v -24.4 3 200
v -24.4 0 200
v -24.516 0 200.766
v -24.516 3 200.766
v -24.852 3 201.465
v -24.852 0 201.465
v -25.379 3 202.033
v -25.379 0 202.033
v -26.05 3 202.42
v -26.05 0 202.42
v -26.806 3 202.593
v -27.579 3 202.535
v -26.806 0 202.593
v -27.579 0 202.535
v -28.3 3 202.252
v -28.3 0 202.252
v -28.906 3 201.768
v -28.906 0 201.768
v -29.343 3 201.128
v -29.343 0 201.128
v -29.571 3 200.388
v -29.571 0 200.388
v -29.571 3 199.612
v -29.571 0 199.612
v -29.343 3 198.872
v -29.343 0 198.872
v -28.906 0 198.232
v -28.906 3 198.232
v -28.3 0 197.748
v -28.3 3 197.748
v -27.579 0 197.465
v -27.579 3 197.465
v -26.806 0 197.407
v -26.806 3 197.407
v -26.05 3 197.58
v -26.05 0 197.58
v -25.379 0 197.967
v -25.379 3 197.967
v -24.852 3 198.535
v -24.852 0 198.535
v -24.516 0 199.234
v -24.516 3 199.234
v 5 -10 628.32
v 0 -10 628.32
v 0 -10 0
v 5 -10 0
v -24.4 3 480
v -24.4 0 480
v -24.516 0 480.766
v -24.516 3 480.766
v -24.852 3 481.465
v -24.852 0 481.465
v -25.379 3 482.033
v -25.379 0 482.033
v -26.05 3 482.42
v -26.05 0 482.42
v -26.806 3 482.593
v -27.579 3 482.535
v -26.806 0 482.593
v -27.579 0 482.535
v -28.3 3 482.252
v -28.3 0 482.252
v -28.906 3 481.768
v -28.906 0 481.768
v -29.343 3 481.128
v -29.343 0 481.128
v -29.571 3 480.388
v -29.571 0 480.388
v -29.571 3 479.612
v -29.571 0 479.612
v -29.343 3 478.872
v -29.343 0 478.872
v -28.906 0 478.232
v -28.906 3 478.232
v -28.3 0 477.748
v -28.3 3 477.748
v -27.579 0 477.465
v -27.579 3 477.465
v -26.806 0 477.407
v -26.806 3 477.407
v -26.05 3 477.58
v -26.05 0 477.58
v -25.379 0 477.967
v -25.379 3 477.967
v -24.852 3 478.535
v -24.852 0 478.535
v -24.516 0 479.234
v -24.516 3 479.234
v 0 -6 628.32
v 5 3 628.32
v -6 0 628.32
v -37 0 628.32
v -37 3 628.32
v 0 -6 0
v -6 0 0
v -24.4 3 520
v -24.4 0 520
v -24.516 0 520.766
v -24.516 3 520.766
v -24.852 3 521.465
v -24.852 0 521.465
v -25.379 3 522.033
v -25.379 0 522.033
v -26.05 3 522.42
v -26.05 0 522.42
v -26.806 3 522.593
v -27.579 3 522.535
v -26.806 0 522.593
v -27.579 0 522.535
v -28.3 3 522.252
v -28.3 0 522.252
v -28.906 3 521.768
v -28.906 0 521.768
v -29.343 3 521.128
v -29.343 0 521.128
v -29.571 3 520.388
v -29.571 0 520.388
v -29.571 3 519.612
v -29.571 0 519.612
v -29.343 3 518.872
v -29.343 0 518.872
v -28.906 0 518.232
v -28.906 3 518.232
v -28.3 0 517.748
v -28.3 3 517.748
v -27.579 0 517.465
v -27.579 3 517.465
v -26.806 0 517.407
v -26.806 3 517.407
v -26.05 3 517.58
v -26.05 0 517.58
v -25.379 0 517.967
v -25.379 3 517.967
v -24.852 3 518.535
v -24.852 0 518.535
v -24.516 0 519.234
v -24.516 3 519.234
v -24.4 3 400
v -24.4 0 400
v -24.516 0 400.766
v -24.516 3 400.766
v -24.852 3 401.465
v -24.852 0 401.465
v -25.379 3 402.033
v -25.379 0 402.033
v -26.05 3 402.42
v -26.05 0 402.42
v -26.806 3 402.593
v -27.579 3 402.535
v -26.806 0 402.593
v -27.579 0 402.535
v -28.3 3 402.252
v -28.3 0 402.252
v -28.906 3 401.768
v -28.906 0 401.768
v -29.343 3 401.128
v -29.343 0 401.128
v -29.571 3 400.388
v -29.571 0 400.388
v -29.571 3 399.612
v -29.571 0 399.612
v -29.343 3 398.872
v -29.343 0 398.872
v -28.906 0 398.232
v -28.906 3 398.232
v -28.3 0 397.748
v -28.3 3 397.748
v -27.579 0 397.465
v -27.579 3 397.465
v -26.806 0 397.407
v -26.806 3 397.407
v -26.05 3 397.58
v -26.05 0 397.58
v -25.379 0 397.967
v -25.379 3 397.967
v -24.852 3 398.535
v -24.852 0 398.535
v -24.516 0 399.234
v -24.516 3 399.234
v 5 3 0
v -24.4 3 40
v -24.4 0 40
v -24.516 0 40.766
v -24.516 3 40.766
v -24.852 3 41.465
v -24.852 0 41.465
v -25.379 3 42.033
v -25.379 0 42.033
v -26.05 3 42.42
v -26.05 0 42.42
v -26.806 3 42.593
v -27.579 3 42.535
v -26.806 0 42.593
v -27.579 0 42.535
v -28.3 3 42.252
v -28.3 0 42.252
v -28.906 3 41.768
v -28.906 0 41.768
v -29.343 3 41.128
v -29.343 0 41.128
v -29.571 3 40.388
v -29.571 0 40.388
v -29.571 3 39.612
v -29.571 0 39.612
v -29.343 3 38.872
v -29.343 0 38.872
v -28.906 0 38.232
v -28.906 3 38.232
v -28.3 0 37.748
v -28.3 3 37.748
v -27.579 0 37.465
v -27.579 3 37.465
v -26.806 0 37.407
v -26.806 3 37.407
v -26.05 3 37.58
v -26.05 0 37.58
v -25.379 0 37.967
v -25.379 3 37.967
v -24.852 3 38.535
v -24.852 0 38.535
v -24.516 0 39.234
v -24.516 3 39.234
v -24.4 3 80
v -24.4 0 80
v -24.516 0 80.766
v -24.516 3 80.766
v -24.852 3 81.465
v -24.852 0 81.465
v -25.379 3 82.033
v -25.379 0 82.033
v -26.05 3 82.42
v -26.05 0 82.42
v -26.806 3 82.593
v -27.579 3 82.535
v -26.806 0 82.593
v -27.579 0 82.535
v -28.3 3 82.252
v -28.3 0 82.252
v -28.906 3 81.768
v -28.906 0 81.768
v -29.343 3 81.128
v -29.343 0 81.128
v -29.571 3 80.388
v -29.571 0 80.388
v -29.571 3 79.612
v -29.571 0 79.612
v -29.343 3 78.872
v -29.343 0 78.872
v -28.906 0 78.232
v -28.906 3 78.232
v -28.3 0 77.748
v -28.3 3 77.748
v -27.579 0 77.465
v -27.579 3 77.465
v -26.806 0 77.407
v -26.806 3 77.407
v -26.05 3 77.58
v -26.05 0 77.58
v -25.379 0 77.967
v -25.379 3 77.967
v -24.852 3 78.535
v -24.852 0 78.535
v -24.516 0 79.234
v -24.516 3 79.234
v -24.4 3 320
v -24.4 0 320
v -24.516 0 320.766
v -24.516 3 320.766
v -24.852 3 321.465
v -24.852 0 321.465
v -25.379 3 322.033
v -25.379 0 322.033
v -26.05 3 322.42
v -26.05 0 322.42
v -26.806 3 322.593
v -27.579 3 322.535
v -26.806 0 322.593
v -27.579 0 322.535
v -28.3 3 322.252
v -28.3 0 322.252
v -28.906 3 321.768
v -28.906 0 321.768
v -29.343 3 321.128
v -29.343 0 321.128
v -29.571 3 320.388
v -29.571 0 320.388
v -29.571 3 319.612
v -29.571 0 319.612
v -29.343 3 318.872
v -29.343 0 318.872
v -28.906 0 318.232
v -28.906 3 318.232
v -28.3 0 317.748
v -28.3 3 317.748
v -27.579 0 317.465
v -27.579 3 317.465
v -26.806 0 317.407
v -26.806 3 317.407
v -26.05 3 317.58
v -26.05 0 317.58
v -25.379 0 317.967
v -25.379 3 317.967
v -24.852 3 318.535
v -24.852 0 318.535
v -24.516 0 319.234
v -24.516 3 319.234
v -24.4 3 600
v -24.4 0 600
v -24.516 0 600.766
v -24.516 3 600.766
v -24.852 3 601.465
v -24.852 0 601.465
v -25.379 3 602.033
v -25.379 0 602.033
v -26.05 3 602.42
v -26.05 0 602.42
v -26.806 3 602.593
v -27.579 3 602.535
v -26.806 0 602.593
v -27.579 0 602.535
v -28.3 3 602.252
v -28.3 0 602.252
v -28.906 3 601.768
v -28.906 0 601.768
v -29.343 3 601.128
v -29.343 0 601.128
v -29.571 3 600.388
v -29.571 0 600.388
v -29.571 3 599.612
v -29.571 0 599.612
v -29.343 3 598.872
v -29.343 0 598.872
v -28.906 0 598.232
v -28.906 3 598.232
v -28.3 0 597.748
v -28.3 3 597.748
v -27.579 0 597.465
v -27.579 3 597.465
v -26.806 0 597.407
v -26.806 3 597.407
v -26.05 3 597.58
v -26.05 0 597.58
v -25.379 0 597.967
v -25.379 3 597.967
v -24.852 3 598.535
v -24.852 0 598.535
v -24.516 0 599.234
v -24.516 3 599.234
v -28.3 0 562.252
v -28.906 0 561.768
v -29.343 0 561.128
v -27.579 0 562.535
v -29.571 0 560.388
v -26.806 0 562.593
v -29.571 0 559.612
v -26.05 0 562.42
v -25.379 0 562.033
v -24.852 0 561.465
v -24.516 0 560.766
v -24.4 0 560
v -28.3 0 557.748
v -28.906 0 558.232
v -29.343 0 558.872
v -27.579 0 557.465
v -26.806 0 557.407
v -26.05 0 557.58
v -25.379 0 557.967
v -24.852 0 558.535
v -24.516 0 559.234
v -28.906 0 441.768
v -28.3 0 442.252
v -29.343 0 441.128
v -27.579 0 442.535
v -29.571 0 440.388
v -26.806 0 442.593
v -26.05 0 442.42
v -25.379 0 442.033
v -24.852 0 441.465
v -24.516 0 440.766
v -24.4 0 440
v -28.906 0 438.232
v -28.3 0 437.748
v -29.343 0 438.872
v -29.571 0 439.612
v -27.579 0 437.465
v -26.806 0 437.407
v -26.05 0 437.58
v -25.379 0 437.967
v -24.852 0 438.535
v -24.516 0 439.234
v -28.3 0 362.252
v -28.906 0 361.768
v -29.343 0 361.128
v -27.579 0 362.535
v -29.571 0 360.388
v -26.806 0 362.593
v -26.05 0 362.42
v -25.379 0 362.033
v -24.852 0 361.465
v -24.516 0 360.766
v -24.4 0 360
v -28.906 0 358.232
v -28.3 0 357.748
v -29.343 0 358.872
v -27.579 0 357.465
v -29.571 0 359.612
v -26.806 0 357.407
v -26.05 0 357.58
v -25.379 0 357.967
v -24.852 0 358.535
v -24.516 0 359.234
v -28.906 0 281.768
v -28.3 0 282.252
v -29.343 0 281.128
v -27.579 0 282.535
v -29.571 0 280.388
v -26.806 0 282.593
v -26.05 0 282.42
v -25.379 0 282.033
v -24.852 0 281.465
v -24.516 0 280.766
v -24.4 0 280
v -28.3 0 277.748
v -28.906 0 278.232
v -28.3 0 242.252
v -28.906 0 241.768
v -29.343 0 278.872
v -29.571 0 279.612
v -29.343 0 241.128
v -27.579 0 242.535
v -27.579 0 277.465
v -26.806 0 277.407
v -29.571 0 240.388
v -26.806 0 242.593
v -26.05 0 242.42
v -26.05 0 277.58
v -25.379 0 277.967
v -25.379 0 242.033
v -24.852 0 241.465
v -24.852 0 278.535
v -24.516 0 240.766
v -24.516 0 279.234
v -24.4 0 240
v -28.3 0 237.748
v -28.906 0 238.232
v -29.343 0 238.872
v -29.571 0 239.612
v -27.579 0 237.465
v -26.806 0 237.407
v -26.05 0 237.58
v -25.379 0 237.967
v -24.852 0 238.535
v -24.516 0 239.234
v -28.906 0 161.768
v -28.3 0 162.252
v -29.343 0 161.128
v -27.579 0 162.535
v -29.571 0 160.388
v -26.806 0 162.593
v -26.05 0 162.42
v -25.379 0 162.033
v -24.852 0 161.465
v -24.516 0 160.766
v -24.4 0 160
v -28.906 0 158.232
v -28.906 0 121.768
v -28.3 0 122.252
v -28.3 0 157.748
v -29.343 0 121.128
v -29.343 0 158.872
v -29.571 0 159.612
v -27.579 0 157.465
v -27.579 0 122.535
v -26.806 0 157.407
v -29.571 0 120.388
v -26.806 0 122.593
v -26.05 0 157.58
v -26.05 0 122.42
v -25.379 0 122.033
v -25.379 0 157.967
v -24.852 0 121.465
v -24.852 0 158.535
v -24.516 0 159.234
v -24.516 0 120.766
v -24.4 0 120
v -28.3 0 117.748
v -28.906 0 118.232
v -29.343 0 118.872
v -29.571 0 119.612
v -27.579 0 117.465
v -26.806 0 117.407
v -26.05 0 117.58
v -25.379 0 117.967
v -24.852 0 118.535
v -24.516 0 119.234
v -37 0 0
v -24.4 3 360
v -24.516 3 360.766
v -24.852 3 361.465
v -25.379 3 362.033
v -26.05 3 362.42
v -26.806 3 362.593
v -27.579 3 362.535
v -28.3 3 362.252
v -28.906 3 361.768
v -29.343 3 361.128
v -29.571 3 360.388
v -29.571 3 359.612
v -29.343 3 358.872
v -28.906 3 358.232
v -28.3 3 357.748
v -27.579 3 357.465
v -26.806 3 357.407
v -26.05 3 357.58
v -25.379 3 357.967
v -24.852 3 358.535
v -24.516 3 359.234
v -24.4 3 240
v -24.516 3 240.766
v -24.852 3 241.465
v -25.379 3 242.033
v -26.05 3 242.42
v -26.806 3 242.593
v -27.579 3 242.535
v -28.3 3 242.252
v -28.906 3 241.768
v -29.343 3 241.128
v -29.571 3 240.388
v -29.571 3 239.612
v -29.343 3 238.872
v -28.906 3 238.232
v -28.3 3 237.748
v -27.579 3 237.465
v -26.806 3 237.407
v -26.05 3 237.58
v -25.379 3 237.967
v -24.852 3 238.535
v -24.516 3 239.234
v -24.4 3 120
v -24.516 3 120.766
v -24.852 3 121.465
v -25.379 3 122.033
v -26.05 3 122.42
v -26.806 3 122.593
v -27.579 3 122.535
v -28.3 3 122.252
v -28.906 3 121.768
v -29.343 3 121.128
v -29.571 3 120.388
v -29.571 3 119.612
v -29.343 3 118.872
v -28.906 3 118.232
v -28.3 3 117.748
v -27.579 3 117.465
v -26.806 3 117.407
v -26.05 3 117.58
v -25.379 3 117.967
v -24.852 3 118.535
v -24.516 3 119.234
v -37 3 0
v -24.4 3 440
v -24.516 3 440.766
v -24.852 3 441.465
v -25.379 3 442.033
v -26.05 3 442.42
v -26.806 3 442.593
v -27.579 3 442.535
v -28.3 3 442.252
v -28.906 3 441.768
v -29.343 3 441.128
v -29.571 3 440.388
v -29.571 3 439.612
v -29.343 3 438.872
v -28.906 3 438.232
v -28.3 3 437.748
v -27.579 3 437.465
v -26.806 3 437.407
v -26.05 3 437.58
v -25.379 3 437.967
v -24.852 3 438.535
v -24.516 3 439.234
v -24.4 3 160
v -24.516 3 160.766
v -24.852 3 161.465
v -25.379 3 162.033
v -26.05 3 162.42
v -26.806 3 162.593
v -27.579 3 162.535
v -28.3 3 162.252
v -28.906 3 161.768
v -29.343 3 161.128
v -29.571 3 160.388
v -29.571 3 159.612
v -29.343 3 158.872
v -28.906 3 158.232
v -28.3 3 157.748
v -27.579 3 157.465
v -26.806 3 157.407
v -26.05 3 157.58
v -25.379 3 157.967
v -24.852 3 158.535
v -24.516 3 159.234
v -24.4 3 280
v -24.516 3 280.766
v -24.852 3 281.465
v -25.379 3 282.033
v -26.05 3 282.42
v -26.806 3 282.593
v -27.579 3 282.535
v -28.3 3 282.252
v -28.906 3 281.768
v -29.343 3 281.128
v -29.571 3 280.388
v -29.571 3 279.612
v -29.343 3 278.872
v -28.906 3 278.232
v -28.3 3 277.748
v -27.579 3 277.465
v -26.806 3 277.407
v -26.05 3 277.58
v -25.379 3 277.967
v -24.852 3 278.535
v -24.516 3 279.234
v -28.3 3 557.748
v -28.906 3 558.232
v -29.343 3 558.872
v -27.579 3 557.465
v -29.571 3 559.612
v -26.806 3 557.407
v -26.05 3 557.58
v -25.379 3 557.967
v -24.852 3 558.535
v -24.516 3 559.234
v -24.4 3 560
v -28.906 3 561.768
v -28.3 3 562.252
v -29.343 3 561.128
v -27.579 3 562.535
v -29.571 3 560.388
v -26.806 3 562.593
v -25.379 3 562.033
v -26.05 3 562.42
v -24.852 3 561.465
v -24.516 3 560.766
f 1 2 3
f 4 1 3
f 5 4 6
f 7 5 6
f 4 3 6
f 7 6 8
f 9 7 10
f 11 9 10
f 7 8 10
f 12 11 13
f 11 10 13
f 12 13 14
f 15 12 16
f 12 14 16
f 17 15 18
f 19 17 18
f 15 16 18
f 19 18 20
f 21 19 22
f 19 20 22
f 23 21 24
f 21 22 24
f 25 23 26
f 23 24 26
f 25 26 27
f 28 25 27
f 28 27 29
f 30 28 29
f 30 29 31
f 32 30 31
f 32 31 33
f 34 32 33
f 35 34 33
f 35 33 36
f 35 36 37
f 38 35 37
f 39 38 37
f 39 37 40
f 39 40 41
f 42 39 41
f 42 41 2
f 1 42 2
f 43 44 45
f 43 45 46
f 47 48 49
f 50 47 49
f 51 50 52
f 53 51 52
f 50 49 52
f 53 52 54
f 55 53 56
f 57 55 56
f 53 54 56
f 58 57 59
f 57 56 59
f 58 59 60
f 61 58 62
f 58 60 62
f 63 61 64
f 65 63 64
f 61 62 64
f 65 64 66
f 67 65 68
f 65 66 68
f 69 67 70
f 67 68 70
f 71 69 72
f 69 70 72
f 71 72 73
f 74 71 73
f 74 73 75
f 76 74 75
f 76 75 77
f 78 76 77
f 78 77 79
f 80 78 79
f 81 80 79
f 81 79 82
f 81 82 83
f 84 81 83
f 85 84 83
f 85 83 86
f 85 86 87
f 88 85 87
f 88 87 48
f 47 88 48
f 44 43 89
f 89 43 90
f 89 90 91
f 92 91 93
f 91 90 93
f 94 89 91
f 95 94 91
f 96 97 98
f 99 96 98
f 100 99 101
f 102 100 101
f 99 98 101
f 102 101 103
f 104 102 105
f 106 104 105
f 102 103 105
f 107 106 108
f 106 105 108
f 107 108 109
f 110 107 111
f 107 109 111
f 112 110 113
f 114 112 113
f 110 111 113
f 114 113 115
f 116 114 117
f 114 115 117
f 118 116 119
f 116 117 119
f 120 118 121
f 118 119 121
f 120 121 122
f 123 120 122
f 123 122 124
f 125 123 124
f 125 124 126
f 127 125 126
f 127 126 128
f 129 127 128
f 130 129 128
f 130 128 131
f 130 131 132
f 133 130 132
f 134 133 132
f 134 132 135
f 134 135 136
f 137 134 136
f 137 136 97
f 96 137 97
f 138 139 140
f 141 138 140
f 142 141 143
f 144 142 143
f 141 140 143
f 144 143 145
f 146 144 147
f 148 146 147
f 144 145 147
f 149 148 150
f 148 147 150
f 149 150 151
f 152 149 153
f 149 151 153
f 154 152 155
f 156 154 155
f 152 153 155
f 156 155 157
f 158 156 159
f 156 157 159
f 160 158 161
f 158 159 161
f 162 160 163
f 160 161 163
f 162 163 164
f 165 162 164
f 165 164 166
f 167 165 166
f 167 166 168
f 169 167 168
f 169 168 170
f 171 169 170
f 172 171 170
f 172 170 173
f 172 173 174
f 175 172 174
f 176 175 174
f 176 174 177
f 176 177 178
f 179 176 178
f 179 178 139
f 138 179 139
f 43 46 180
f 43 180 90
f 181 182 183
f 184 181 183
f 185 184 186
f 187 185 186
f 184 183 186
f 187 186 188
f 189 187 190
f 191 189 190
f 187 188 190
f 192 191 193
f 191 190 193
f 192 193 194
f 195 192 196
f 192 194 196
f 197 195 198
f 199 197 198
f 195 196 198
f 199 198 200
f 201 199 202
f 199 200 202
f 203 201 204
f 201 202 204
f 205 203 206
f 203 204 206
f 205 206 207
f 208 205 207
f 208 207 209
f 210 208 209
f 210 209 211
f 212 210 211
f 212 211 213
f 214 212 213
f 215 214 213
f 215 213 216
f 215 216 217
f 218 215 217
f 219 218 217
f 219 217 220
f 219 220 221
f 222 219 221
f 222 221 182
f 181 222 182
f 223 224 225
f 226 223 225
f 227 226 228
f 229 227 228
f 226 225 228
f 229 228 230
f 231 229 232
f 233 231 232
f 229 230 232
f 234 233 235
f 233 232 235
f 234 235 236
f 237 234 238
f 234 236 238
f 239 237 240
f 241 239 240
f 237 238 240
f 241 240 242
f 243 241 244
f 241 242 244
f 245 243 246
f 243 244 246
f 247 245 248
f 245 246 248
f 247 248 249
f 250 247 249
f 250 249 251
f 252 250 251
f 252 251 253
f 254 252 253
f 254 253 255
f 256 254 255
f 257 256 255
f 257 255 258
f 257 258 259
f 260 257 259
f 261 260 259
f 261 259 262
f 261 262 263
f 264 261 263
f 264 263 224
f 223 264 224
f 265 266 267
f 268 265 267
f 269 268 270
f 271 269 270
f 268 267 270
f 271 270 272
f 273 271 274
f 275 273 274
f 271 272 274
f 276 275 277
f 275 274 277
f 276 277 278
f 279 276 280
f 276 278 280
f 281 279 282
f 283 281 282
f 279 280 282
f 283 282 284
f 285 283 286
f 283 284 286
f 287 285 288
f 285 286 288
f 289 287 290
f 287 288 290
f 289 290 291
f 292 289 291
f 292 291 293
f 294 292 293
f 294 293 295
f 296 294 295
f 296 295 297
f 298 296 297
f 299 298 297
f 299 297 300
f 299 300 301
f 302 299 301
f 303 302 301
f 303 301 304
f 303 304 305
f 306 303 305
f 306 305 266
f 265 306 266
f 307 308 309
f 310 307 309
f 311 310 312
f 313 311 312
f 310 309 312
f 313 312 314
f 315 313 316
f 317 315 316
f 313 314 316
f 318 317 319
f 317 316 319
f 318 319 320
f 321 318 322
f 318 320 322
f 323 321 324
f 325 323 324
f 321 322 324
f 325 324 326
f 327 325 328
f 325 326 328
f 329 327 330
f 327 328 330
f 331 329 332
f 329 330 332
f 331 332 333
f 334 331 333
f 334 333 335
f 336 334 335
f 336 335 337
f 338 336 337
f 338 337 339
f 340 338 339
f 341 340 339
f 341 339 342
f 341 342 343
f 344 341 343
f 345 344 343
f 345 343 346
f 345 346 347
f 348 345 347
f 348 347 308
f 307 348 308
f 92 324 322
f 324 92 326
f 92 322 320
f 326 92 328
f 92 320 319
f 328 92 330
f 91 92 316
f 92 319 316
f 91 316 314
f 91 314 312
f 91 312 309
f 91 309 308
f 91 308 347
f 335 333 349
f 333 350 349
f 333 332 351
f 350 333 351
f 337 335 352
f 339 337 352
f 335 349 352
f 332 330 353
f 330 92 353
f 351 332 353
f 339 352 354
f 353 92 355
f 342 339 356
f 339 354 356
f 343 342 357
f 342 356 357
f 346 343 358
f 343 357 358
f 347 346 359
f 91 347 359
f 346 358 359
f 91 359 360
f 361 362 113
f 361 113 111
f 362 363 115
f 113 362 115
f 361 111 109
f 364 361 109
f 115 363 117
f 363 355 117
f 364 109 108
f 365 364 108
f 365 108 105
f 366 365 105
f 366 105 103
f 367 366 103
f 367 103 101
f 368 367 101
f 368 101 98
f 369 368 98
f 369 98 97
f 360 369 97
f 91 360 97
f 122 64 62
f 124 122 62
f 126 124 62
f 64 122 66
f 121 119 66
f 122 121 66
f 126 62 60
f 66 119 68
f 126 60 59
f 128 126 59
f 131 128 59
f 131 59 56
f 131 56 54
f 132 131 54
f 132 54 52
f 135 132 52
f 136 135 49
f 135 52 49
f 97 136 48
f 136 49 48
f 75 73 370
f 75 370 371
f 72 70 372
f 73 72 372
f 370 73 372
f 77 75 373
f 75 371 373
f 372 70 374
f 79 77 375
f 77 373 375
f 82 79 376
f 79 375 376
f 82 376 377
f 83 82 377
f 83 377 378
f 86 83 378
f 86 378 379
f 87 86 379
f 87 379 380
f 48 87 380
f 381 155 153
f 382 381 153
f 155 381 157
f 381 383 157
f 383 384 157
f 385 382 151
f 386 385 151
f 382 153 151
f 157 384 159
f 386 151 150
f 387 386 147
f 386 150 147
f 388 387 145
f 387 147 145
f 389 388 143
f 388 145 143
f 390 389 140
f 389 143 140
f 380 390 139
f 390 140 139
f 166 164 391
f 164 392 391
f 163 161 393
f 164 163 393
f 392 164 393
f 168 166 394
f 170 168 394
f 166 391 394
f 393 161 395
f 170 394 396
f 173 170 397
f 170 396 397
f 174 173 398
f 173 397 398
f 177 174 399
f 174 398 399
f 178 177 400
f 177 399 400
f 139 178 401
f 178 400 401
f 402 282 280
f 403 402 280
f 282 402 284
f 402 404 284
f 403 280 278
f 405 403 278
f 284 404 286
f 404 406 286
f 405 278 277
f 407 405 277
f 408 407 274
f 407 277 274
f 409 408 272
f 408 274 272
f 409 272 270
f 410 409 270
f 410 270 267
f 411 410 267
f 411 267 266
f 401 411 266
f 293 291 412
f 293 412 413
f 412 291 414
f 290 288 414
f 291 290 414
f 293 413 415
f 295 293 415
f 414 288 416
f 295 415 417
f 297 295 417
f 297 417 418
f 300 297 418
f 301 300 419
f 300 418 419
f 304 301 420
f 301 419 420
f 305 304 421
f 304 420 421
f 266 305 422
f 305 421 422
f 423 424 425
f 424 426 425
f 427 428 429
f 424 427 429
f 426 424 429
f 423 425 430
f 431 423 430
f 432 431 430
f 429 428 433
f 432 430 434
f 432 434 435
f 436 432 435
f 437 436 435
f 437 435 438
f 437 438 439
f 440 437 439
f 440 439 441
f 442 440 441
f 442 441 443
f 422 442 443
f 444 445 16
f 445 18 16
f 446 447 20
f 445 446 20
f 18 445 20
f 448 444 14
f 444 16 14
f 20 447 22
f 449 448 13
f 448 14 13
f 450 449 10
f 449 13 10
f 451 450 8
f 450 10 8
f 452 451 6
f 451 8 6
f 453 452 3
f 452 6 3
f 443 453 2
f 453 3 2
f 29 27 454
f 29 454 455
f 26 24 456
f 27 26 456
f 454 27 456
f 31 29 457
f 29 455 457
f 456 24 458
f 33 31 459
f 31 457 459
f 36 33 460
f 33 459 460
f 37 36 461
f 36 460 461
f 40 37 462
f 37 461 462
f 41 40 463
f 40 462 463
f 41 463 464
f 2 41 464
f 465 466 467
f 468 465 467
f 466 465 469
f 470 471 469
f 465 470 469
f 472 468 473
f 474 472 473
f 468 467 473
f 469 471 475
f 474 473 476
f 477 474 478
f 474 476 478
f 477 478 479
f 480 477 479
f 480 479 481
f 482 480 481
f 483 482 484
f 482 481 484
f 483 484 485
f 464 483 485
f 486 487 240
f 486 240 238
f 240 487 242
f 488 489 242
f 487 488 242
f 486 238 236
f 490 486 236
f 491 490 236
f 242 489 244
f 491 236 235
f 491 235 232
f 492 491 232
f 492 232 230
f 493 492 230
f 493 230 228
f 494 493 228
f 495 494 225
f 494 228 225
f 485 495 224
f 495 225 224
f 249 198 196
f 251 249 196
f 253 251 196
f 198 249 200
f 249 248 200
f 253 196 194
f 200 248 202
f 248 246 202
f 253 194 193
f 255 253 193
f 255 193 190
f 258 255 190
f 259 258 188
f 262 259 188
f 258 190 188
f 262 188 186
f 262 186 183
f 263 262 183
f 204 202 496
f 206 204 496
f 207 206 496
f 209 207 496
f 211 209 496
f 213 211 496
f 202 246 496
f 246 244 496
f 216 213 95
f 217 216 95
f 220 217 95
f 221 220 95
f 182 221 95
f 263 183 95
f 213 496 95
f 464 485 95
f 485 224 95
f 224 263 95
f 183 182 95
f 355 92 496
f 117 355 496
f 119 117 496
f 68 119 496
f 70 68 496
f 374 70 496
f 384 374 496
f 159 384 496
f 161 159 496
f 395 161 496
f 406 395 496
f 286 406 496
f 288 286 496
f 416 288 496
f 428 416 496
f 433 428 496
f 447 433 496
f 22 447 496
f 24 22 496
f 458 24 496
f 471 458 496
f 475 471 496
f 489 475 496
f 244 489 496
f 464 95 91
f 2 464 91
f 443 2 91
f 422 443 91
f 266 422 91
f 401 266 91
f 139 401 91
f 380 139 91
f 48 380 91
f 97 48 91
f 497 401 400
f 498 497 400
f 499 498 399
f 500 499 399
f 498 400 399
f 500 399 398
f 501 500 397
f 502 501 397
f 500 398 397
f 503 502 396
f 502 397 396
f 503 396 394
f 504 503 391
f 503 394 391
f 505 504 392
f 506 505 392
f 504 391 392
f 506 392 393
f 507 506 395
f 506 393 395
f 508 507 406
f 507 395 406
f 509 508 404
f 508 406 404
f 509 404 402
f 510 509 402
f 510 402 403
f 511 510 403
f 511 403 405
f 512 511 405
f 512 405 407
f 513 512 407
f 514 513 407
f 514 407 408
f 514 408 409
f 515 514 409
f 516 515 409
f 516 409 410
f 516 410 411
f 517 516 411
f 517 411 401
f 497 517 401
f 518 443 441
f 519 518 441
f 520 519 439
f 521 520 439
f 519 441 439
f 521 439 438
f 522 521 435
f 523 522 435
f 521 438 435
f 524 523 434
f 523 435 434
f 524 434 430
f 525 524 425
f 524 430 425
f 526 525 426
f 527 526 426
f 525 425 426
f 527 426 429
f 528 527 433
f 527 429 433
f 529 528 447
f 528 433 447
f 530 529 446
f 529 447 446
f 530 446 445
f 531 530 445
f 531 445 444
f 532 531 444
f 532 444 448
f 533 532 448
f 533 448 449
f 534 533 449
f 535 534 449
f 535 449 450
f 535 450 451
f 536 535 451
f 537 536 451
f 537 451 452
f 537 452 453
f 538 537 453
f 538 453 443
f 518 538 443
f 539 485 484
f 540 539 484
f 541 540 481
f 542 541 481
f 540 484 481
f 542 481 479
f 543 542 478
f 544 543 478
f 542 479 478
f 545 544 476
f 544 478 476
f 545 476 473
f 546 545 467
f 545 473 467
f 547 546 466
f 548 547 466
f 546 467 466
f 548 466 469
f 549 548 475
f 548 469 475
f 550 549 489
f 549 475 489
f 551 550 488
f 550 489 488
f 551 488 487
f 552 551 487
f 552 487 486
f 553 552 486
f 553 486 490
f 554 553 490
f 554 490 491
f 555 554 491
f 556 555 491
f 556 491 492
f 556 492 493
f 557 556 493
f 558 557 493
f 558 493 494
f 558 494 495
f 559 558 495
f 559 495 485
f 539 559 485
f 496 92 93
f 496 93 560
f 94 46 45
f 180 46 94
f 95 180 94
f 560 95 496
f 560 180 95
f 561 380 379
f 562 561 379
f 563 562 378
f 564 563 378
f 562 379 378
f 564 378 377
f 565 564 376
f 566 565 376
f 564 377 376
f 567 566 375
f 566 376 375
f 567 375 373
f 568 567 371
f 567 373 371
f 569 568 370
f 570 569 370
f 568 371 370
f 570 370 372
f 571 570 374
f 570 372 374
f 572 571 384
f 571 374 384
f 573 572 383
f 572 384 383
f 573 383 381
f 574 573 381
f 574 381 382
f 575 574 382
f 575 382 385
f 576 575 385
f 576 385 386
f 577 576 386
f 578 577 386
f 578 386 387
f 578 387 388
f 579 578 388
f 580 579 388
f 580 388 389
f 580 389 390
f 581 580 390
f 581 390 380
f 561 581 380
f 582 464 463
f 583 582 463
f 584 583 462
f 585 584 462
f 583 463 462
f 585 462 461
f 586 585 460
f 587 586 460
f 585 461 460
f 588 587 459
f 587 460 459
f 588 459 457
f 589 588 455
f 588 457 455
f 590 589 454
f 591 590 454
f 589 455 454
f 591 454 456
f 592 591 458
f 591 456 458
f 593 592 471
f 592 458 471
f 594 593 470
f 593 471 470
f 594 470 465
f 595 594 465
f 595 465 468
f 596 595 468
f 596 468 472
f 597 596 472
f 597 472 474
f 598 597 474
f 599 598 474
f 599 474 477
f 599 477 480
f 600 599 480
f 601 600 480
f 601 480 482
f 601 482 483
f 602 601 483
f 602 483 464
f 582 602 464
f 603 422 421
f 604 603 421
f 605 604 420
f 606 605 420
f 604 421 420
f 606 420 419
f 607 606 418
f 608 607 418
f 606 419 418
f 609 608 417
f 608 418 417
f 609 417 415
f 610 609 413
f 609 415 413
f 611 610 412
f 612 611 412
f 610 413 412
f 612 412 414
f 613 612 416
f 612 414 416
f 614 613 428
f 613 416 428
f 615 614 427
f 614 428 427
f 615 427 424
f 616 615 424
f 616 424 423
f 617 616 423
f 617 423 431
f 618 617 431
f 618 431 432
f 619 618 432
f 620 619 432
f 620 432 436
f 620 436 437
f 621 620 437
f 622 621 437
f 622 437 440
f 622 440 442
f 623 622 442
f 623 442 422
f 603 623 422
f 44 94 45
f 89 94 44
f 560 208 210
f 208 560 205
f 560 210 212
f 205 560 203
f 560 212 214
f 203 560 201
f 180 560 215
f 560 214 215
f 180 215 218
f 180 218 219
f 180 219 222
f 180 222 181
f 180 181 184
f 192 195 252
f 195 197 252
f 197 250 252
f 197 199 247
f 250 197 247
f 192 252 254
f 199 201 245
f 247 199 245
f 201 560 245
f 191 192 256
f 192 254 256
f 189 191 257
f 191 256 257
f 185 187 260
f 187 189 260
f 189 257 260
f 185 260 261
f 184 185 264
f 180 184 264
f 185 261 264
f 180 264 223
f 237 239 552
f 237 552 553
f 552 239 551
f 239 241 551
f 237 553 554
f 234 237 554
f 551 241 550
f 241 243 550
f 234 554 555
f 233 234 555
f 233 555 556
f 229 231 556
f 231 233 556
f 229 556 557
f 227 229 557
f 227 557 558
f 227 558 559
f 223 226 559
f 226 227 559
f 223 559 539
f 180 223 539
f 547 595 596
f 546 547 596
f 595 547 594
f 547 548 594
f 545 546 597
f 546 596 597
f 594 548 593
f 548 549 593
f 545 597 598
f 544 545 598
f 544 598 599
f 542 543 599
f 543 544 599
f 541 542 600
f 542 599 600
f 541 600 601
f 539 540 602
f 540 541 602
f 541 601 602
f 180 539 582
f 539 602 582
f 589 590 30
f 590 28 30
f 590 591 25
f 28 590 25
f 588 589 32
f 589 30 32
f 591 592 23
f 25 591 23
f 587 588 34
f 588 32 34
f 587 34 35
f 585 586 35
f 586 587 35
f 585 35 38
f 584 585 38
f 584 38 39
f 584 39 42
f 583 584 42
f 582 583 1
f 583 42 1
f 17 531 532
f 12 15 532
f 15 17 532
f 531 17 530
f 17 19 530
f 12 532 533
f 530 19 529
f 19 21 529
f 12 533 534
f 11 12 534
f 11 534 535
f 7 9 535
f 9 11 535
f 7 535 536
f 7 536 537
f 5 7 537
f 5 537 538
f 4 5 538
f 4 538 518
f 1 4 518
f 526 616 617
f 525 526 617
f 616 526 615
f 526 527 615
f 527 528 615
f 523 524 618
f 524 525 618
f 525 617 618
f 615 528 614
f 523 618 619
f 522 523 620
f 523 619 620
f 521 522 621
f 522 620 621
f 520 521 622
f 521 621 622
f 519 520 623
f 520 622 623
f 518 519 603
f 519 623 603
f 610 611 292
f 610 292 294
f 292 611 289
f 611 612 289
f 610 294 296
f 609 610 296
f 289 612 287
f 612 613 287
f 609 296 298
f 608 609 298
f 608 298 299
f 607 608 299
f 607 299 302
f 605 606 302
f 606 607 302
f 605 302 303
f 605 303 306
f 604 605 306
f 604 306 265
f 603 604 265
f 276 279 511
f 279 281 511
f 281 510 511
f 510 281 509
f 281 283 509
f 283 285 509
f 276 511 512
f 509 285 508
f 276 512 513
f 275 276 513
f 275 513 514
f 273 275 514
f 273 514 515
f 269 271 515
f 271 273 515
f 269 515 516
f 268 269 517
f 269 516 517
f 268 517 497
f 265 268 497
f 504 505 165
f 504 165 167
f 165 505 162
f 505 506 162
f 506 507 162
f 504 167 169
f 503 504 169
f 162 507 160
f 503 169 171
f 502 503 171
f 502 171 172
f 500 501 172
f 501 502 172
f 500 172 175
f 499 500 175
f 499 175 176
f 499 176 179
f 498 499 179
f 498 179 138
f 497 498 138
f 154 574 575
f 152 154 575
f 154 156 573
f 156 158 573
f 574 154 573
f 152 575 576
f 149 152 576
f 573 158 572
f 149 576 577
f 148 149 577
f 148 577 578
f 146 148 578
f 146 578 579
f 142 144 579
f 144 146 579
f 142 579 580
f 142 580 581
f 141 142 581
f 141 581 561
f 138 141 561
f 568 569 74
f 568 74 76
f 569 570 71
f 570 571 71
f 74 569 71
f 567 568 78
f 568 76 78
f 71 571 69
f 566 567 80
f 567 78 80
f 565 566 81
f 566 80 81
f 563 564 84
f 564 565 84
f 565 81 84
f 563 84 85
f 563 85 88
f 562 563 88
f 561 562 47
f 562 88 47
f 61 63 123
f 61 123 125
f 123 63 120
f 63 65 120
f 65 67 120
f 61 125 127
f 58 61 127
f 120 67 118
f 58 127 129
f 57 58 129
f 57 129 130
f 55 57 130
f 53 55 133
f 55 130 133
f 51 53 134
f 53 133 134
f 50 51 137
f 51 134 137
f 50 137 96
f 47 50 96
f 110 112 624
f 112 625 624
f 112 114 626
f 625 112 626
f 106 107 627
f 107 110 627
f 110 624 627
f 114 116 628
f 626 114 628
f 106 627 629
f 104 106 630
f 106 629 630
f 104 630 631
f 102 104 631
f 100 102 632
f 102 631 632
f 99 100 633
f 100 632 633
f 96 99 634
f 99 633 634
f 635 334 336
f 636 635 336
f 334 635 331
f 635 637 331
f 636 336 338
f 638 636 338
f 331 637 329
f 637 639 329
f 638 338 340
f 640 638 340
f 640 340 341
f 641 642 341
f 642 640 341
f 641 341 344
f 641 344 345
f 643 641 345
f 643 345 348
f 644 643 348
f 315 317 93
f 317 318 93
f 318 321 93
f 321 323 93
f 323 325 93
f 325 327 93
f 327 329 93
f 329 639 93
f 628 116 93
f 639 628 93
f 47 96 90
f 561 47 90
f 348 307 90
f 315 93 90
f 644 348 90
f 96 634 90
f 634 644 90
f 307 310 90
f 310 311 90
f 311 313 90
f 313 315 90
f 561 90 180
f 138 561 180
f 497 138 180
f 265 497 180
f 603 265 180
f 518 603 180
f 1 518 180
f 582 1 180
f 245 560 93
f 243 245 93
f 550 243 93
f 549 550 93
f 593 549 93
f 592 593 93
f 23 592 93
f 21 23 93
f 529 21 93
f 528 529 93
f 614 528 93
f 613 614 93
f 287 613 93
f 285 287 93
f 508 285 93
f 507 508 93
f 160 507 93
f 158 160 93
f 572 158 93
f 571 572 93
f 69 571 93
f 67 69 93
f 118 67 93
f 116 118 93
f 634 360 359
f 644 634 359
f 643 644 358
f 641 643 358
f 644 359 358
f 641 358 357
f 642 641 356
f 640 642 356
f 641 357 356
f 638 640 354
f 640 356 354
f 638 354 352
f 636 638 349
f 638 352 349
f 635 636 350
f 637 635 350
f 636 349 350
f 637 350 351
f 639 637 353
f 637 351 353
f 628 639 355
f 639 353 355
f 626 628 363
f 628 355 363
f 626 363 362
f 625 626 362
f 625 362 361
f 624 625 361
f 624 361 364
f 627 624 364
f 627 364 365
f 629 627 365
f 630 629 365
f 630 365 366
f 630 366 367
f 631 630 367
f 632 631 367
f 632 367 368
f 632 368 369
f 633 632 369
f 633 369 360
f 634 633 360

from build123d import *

# Parameters (mm, degrees)
SKETCH_1_W           = 37
SKETCH_1_H           = 628.32
EXTRUDE_1_DEPTH      = 3
SKETCH_2_W           = 5
SKETCH_2_H           = 628.32
EXTRUDE_2_DEPTH      = 10
EXTRUDE_2_DEPTH_BACK = 3
SKETCH_3_R           = 2.6
CUT_EXTRUDE_1_DEPTH  = 10
EXTRUDE_3_DEPTH      = 628.32


with BuildPart() as part:
    # 스케치1 → 보스-돌출1 (new body)
    with BuildSketch(Plane(origin=(0, 0, 0), x_dir=(1, 0, 0), z_dir=(0, 1, 0))):
        with Locations((-18.5, -314.16)):
            Rectangle(SKETCH_1_W, SKETCH_1_H)
    extrude(amount=EXTRUDE_1_DEPTH)

    # 스케치2 → 보스-돌출2 (add, two sides)
    with BuildSketch(Plane.XZ) as extrude_2_sk:
        with Locations((2.5, 314.16)):
            Rectangle(SKETCH_2_W, SKETCH_2_H)
    extrude(amount=EXTRUDE_2_DEPTH)
    extrude(extrude_2_sk.sketch, amount=-EXTRUDE_2_DEPTH_BACK)

    # 스케치3 → 컷-돌출1 (cut)
    with BuildSketch(Plane.XZ):
        with Locations((-27, 40)):
            Circle(SKETCH_3_R)
        with Locations((-27, 80)):
            Circle(SKETCH_3_R)
        with Locations((-27, 120)):
            Circle(SKETCH_3_R)
        with Locations((-27, 160)):
            Circle(SKETCH_3_R)
        with Locations((-27, 200)):
            Circle(SKETCH_3_R)
        with Locations((-27, 240)):
            Circle(SKETCH_3_R)
        with Locations((-27, 280)):
            Circle(SKETCH_3_R)
        with Locations((-27, 320)):
            Circle(SKETCH_3_R)
        with Locations((-27, 360)):
            Circle(SKETCH_3_R)
        with Locations((-27, 400)):
            Circle(SKETCH_3_R)
        with Locations((-27, 440)):
            Circle(SKETCH_3_R)
        with Locations((-27, 480)):
            Circle(SKETCH_3_R)
        with Locations((-27, 520)):
            Circle(SKETCH_3_R)
        with Locations((-27, 560)):
            Circle(SKETCH_3_R)
        with Locations((-27, 600)):
            Circle(SKETCH_3_R)
        with Locations((-27, 640)):
            Circle(SKETCH_3_R)
    extrude(amount=-CUT_EXTRUDE_1_DEPTH, mode=Mode.SUBTRACT)

    # 스케치4 → 보스-돌출3 (add)
    with BuildSketch(Plane.XY.offset(628.32)):
        Polygon((0, 0), (0, -6), (-6, 0), align=None)
    extrude(amount=-EXTRUDE_3_DEPTH)


solid = part.part
